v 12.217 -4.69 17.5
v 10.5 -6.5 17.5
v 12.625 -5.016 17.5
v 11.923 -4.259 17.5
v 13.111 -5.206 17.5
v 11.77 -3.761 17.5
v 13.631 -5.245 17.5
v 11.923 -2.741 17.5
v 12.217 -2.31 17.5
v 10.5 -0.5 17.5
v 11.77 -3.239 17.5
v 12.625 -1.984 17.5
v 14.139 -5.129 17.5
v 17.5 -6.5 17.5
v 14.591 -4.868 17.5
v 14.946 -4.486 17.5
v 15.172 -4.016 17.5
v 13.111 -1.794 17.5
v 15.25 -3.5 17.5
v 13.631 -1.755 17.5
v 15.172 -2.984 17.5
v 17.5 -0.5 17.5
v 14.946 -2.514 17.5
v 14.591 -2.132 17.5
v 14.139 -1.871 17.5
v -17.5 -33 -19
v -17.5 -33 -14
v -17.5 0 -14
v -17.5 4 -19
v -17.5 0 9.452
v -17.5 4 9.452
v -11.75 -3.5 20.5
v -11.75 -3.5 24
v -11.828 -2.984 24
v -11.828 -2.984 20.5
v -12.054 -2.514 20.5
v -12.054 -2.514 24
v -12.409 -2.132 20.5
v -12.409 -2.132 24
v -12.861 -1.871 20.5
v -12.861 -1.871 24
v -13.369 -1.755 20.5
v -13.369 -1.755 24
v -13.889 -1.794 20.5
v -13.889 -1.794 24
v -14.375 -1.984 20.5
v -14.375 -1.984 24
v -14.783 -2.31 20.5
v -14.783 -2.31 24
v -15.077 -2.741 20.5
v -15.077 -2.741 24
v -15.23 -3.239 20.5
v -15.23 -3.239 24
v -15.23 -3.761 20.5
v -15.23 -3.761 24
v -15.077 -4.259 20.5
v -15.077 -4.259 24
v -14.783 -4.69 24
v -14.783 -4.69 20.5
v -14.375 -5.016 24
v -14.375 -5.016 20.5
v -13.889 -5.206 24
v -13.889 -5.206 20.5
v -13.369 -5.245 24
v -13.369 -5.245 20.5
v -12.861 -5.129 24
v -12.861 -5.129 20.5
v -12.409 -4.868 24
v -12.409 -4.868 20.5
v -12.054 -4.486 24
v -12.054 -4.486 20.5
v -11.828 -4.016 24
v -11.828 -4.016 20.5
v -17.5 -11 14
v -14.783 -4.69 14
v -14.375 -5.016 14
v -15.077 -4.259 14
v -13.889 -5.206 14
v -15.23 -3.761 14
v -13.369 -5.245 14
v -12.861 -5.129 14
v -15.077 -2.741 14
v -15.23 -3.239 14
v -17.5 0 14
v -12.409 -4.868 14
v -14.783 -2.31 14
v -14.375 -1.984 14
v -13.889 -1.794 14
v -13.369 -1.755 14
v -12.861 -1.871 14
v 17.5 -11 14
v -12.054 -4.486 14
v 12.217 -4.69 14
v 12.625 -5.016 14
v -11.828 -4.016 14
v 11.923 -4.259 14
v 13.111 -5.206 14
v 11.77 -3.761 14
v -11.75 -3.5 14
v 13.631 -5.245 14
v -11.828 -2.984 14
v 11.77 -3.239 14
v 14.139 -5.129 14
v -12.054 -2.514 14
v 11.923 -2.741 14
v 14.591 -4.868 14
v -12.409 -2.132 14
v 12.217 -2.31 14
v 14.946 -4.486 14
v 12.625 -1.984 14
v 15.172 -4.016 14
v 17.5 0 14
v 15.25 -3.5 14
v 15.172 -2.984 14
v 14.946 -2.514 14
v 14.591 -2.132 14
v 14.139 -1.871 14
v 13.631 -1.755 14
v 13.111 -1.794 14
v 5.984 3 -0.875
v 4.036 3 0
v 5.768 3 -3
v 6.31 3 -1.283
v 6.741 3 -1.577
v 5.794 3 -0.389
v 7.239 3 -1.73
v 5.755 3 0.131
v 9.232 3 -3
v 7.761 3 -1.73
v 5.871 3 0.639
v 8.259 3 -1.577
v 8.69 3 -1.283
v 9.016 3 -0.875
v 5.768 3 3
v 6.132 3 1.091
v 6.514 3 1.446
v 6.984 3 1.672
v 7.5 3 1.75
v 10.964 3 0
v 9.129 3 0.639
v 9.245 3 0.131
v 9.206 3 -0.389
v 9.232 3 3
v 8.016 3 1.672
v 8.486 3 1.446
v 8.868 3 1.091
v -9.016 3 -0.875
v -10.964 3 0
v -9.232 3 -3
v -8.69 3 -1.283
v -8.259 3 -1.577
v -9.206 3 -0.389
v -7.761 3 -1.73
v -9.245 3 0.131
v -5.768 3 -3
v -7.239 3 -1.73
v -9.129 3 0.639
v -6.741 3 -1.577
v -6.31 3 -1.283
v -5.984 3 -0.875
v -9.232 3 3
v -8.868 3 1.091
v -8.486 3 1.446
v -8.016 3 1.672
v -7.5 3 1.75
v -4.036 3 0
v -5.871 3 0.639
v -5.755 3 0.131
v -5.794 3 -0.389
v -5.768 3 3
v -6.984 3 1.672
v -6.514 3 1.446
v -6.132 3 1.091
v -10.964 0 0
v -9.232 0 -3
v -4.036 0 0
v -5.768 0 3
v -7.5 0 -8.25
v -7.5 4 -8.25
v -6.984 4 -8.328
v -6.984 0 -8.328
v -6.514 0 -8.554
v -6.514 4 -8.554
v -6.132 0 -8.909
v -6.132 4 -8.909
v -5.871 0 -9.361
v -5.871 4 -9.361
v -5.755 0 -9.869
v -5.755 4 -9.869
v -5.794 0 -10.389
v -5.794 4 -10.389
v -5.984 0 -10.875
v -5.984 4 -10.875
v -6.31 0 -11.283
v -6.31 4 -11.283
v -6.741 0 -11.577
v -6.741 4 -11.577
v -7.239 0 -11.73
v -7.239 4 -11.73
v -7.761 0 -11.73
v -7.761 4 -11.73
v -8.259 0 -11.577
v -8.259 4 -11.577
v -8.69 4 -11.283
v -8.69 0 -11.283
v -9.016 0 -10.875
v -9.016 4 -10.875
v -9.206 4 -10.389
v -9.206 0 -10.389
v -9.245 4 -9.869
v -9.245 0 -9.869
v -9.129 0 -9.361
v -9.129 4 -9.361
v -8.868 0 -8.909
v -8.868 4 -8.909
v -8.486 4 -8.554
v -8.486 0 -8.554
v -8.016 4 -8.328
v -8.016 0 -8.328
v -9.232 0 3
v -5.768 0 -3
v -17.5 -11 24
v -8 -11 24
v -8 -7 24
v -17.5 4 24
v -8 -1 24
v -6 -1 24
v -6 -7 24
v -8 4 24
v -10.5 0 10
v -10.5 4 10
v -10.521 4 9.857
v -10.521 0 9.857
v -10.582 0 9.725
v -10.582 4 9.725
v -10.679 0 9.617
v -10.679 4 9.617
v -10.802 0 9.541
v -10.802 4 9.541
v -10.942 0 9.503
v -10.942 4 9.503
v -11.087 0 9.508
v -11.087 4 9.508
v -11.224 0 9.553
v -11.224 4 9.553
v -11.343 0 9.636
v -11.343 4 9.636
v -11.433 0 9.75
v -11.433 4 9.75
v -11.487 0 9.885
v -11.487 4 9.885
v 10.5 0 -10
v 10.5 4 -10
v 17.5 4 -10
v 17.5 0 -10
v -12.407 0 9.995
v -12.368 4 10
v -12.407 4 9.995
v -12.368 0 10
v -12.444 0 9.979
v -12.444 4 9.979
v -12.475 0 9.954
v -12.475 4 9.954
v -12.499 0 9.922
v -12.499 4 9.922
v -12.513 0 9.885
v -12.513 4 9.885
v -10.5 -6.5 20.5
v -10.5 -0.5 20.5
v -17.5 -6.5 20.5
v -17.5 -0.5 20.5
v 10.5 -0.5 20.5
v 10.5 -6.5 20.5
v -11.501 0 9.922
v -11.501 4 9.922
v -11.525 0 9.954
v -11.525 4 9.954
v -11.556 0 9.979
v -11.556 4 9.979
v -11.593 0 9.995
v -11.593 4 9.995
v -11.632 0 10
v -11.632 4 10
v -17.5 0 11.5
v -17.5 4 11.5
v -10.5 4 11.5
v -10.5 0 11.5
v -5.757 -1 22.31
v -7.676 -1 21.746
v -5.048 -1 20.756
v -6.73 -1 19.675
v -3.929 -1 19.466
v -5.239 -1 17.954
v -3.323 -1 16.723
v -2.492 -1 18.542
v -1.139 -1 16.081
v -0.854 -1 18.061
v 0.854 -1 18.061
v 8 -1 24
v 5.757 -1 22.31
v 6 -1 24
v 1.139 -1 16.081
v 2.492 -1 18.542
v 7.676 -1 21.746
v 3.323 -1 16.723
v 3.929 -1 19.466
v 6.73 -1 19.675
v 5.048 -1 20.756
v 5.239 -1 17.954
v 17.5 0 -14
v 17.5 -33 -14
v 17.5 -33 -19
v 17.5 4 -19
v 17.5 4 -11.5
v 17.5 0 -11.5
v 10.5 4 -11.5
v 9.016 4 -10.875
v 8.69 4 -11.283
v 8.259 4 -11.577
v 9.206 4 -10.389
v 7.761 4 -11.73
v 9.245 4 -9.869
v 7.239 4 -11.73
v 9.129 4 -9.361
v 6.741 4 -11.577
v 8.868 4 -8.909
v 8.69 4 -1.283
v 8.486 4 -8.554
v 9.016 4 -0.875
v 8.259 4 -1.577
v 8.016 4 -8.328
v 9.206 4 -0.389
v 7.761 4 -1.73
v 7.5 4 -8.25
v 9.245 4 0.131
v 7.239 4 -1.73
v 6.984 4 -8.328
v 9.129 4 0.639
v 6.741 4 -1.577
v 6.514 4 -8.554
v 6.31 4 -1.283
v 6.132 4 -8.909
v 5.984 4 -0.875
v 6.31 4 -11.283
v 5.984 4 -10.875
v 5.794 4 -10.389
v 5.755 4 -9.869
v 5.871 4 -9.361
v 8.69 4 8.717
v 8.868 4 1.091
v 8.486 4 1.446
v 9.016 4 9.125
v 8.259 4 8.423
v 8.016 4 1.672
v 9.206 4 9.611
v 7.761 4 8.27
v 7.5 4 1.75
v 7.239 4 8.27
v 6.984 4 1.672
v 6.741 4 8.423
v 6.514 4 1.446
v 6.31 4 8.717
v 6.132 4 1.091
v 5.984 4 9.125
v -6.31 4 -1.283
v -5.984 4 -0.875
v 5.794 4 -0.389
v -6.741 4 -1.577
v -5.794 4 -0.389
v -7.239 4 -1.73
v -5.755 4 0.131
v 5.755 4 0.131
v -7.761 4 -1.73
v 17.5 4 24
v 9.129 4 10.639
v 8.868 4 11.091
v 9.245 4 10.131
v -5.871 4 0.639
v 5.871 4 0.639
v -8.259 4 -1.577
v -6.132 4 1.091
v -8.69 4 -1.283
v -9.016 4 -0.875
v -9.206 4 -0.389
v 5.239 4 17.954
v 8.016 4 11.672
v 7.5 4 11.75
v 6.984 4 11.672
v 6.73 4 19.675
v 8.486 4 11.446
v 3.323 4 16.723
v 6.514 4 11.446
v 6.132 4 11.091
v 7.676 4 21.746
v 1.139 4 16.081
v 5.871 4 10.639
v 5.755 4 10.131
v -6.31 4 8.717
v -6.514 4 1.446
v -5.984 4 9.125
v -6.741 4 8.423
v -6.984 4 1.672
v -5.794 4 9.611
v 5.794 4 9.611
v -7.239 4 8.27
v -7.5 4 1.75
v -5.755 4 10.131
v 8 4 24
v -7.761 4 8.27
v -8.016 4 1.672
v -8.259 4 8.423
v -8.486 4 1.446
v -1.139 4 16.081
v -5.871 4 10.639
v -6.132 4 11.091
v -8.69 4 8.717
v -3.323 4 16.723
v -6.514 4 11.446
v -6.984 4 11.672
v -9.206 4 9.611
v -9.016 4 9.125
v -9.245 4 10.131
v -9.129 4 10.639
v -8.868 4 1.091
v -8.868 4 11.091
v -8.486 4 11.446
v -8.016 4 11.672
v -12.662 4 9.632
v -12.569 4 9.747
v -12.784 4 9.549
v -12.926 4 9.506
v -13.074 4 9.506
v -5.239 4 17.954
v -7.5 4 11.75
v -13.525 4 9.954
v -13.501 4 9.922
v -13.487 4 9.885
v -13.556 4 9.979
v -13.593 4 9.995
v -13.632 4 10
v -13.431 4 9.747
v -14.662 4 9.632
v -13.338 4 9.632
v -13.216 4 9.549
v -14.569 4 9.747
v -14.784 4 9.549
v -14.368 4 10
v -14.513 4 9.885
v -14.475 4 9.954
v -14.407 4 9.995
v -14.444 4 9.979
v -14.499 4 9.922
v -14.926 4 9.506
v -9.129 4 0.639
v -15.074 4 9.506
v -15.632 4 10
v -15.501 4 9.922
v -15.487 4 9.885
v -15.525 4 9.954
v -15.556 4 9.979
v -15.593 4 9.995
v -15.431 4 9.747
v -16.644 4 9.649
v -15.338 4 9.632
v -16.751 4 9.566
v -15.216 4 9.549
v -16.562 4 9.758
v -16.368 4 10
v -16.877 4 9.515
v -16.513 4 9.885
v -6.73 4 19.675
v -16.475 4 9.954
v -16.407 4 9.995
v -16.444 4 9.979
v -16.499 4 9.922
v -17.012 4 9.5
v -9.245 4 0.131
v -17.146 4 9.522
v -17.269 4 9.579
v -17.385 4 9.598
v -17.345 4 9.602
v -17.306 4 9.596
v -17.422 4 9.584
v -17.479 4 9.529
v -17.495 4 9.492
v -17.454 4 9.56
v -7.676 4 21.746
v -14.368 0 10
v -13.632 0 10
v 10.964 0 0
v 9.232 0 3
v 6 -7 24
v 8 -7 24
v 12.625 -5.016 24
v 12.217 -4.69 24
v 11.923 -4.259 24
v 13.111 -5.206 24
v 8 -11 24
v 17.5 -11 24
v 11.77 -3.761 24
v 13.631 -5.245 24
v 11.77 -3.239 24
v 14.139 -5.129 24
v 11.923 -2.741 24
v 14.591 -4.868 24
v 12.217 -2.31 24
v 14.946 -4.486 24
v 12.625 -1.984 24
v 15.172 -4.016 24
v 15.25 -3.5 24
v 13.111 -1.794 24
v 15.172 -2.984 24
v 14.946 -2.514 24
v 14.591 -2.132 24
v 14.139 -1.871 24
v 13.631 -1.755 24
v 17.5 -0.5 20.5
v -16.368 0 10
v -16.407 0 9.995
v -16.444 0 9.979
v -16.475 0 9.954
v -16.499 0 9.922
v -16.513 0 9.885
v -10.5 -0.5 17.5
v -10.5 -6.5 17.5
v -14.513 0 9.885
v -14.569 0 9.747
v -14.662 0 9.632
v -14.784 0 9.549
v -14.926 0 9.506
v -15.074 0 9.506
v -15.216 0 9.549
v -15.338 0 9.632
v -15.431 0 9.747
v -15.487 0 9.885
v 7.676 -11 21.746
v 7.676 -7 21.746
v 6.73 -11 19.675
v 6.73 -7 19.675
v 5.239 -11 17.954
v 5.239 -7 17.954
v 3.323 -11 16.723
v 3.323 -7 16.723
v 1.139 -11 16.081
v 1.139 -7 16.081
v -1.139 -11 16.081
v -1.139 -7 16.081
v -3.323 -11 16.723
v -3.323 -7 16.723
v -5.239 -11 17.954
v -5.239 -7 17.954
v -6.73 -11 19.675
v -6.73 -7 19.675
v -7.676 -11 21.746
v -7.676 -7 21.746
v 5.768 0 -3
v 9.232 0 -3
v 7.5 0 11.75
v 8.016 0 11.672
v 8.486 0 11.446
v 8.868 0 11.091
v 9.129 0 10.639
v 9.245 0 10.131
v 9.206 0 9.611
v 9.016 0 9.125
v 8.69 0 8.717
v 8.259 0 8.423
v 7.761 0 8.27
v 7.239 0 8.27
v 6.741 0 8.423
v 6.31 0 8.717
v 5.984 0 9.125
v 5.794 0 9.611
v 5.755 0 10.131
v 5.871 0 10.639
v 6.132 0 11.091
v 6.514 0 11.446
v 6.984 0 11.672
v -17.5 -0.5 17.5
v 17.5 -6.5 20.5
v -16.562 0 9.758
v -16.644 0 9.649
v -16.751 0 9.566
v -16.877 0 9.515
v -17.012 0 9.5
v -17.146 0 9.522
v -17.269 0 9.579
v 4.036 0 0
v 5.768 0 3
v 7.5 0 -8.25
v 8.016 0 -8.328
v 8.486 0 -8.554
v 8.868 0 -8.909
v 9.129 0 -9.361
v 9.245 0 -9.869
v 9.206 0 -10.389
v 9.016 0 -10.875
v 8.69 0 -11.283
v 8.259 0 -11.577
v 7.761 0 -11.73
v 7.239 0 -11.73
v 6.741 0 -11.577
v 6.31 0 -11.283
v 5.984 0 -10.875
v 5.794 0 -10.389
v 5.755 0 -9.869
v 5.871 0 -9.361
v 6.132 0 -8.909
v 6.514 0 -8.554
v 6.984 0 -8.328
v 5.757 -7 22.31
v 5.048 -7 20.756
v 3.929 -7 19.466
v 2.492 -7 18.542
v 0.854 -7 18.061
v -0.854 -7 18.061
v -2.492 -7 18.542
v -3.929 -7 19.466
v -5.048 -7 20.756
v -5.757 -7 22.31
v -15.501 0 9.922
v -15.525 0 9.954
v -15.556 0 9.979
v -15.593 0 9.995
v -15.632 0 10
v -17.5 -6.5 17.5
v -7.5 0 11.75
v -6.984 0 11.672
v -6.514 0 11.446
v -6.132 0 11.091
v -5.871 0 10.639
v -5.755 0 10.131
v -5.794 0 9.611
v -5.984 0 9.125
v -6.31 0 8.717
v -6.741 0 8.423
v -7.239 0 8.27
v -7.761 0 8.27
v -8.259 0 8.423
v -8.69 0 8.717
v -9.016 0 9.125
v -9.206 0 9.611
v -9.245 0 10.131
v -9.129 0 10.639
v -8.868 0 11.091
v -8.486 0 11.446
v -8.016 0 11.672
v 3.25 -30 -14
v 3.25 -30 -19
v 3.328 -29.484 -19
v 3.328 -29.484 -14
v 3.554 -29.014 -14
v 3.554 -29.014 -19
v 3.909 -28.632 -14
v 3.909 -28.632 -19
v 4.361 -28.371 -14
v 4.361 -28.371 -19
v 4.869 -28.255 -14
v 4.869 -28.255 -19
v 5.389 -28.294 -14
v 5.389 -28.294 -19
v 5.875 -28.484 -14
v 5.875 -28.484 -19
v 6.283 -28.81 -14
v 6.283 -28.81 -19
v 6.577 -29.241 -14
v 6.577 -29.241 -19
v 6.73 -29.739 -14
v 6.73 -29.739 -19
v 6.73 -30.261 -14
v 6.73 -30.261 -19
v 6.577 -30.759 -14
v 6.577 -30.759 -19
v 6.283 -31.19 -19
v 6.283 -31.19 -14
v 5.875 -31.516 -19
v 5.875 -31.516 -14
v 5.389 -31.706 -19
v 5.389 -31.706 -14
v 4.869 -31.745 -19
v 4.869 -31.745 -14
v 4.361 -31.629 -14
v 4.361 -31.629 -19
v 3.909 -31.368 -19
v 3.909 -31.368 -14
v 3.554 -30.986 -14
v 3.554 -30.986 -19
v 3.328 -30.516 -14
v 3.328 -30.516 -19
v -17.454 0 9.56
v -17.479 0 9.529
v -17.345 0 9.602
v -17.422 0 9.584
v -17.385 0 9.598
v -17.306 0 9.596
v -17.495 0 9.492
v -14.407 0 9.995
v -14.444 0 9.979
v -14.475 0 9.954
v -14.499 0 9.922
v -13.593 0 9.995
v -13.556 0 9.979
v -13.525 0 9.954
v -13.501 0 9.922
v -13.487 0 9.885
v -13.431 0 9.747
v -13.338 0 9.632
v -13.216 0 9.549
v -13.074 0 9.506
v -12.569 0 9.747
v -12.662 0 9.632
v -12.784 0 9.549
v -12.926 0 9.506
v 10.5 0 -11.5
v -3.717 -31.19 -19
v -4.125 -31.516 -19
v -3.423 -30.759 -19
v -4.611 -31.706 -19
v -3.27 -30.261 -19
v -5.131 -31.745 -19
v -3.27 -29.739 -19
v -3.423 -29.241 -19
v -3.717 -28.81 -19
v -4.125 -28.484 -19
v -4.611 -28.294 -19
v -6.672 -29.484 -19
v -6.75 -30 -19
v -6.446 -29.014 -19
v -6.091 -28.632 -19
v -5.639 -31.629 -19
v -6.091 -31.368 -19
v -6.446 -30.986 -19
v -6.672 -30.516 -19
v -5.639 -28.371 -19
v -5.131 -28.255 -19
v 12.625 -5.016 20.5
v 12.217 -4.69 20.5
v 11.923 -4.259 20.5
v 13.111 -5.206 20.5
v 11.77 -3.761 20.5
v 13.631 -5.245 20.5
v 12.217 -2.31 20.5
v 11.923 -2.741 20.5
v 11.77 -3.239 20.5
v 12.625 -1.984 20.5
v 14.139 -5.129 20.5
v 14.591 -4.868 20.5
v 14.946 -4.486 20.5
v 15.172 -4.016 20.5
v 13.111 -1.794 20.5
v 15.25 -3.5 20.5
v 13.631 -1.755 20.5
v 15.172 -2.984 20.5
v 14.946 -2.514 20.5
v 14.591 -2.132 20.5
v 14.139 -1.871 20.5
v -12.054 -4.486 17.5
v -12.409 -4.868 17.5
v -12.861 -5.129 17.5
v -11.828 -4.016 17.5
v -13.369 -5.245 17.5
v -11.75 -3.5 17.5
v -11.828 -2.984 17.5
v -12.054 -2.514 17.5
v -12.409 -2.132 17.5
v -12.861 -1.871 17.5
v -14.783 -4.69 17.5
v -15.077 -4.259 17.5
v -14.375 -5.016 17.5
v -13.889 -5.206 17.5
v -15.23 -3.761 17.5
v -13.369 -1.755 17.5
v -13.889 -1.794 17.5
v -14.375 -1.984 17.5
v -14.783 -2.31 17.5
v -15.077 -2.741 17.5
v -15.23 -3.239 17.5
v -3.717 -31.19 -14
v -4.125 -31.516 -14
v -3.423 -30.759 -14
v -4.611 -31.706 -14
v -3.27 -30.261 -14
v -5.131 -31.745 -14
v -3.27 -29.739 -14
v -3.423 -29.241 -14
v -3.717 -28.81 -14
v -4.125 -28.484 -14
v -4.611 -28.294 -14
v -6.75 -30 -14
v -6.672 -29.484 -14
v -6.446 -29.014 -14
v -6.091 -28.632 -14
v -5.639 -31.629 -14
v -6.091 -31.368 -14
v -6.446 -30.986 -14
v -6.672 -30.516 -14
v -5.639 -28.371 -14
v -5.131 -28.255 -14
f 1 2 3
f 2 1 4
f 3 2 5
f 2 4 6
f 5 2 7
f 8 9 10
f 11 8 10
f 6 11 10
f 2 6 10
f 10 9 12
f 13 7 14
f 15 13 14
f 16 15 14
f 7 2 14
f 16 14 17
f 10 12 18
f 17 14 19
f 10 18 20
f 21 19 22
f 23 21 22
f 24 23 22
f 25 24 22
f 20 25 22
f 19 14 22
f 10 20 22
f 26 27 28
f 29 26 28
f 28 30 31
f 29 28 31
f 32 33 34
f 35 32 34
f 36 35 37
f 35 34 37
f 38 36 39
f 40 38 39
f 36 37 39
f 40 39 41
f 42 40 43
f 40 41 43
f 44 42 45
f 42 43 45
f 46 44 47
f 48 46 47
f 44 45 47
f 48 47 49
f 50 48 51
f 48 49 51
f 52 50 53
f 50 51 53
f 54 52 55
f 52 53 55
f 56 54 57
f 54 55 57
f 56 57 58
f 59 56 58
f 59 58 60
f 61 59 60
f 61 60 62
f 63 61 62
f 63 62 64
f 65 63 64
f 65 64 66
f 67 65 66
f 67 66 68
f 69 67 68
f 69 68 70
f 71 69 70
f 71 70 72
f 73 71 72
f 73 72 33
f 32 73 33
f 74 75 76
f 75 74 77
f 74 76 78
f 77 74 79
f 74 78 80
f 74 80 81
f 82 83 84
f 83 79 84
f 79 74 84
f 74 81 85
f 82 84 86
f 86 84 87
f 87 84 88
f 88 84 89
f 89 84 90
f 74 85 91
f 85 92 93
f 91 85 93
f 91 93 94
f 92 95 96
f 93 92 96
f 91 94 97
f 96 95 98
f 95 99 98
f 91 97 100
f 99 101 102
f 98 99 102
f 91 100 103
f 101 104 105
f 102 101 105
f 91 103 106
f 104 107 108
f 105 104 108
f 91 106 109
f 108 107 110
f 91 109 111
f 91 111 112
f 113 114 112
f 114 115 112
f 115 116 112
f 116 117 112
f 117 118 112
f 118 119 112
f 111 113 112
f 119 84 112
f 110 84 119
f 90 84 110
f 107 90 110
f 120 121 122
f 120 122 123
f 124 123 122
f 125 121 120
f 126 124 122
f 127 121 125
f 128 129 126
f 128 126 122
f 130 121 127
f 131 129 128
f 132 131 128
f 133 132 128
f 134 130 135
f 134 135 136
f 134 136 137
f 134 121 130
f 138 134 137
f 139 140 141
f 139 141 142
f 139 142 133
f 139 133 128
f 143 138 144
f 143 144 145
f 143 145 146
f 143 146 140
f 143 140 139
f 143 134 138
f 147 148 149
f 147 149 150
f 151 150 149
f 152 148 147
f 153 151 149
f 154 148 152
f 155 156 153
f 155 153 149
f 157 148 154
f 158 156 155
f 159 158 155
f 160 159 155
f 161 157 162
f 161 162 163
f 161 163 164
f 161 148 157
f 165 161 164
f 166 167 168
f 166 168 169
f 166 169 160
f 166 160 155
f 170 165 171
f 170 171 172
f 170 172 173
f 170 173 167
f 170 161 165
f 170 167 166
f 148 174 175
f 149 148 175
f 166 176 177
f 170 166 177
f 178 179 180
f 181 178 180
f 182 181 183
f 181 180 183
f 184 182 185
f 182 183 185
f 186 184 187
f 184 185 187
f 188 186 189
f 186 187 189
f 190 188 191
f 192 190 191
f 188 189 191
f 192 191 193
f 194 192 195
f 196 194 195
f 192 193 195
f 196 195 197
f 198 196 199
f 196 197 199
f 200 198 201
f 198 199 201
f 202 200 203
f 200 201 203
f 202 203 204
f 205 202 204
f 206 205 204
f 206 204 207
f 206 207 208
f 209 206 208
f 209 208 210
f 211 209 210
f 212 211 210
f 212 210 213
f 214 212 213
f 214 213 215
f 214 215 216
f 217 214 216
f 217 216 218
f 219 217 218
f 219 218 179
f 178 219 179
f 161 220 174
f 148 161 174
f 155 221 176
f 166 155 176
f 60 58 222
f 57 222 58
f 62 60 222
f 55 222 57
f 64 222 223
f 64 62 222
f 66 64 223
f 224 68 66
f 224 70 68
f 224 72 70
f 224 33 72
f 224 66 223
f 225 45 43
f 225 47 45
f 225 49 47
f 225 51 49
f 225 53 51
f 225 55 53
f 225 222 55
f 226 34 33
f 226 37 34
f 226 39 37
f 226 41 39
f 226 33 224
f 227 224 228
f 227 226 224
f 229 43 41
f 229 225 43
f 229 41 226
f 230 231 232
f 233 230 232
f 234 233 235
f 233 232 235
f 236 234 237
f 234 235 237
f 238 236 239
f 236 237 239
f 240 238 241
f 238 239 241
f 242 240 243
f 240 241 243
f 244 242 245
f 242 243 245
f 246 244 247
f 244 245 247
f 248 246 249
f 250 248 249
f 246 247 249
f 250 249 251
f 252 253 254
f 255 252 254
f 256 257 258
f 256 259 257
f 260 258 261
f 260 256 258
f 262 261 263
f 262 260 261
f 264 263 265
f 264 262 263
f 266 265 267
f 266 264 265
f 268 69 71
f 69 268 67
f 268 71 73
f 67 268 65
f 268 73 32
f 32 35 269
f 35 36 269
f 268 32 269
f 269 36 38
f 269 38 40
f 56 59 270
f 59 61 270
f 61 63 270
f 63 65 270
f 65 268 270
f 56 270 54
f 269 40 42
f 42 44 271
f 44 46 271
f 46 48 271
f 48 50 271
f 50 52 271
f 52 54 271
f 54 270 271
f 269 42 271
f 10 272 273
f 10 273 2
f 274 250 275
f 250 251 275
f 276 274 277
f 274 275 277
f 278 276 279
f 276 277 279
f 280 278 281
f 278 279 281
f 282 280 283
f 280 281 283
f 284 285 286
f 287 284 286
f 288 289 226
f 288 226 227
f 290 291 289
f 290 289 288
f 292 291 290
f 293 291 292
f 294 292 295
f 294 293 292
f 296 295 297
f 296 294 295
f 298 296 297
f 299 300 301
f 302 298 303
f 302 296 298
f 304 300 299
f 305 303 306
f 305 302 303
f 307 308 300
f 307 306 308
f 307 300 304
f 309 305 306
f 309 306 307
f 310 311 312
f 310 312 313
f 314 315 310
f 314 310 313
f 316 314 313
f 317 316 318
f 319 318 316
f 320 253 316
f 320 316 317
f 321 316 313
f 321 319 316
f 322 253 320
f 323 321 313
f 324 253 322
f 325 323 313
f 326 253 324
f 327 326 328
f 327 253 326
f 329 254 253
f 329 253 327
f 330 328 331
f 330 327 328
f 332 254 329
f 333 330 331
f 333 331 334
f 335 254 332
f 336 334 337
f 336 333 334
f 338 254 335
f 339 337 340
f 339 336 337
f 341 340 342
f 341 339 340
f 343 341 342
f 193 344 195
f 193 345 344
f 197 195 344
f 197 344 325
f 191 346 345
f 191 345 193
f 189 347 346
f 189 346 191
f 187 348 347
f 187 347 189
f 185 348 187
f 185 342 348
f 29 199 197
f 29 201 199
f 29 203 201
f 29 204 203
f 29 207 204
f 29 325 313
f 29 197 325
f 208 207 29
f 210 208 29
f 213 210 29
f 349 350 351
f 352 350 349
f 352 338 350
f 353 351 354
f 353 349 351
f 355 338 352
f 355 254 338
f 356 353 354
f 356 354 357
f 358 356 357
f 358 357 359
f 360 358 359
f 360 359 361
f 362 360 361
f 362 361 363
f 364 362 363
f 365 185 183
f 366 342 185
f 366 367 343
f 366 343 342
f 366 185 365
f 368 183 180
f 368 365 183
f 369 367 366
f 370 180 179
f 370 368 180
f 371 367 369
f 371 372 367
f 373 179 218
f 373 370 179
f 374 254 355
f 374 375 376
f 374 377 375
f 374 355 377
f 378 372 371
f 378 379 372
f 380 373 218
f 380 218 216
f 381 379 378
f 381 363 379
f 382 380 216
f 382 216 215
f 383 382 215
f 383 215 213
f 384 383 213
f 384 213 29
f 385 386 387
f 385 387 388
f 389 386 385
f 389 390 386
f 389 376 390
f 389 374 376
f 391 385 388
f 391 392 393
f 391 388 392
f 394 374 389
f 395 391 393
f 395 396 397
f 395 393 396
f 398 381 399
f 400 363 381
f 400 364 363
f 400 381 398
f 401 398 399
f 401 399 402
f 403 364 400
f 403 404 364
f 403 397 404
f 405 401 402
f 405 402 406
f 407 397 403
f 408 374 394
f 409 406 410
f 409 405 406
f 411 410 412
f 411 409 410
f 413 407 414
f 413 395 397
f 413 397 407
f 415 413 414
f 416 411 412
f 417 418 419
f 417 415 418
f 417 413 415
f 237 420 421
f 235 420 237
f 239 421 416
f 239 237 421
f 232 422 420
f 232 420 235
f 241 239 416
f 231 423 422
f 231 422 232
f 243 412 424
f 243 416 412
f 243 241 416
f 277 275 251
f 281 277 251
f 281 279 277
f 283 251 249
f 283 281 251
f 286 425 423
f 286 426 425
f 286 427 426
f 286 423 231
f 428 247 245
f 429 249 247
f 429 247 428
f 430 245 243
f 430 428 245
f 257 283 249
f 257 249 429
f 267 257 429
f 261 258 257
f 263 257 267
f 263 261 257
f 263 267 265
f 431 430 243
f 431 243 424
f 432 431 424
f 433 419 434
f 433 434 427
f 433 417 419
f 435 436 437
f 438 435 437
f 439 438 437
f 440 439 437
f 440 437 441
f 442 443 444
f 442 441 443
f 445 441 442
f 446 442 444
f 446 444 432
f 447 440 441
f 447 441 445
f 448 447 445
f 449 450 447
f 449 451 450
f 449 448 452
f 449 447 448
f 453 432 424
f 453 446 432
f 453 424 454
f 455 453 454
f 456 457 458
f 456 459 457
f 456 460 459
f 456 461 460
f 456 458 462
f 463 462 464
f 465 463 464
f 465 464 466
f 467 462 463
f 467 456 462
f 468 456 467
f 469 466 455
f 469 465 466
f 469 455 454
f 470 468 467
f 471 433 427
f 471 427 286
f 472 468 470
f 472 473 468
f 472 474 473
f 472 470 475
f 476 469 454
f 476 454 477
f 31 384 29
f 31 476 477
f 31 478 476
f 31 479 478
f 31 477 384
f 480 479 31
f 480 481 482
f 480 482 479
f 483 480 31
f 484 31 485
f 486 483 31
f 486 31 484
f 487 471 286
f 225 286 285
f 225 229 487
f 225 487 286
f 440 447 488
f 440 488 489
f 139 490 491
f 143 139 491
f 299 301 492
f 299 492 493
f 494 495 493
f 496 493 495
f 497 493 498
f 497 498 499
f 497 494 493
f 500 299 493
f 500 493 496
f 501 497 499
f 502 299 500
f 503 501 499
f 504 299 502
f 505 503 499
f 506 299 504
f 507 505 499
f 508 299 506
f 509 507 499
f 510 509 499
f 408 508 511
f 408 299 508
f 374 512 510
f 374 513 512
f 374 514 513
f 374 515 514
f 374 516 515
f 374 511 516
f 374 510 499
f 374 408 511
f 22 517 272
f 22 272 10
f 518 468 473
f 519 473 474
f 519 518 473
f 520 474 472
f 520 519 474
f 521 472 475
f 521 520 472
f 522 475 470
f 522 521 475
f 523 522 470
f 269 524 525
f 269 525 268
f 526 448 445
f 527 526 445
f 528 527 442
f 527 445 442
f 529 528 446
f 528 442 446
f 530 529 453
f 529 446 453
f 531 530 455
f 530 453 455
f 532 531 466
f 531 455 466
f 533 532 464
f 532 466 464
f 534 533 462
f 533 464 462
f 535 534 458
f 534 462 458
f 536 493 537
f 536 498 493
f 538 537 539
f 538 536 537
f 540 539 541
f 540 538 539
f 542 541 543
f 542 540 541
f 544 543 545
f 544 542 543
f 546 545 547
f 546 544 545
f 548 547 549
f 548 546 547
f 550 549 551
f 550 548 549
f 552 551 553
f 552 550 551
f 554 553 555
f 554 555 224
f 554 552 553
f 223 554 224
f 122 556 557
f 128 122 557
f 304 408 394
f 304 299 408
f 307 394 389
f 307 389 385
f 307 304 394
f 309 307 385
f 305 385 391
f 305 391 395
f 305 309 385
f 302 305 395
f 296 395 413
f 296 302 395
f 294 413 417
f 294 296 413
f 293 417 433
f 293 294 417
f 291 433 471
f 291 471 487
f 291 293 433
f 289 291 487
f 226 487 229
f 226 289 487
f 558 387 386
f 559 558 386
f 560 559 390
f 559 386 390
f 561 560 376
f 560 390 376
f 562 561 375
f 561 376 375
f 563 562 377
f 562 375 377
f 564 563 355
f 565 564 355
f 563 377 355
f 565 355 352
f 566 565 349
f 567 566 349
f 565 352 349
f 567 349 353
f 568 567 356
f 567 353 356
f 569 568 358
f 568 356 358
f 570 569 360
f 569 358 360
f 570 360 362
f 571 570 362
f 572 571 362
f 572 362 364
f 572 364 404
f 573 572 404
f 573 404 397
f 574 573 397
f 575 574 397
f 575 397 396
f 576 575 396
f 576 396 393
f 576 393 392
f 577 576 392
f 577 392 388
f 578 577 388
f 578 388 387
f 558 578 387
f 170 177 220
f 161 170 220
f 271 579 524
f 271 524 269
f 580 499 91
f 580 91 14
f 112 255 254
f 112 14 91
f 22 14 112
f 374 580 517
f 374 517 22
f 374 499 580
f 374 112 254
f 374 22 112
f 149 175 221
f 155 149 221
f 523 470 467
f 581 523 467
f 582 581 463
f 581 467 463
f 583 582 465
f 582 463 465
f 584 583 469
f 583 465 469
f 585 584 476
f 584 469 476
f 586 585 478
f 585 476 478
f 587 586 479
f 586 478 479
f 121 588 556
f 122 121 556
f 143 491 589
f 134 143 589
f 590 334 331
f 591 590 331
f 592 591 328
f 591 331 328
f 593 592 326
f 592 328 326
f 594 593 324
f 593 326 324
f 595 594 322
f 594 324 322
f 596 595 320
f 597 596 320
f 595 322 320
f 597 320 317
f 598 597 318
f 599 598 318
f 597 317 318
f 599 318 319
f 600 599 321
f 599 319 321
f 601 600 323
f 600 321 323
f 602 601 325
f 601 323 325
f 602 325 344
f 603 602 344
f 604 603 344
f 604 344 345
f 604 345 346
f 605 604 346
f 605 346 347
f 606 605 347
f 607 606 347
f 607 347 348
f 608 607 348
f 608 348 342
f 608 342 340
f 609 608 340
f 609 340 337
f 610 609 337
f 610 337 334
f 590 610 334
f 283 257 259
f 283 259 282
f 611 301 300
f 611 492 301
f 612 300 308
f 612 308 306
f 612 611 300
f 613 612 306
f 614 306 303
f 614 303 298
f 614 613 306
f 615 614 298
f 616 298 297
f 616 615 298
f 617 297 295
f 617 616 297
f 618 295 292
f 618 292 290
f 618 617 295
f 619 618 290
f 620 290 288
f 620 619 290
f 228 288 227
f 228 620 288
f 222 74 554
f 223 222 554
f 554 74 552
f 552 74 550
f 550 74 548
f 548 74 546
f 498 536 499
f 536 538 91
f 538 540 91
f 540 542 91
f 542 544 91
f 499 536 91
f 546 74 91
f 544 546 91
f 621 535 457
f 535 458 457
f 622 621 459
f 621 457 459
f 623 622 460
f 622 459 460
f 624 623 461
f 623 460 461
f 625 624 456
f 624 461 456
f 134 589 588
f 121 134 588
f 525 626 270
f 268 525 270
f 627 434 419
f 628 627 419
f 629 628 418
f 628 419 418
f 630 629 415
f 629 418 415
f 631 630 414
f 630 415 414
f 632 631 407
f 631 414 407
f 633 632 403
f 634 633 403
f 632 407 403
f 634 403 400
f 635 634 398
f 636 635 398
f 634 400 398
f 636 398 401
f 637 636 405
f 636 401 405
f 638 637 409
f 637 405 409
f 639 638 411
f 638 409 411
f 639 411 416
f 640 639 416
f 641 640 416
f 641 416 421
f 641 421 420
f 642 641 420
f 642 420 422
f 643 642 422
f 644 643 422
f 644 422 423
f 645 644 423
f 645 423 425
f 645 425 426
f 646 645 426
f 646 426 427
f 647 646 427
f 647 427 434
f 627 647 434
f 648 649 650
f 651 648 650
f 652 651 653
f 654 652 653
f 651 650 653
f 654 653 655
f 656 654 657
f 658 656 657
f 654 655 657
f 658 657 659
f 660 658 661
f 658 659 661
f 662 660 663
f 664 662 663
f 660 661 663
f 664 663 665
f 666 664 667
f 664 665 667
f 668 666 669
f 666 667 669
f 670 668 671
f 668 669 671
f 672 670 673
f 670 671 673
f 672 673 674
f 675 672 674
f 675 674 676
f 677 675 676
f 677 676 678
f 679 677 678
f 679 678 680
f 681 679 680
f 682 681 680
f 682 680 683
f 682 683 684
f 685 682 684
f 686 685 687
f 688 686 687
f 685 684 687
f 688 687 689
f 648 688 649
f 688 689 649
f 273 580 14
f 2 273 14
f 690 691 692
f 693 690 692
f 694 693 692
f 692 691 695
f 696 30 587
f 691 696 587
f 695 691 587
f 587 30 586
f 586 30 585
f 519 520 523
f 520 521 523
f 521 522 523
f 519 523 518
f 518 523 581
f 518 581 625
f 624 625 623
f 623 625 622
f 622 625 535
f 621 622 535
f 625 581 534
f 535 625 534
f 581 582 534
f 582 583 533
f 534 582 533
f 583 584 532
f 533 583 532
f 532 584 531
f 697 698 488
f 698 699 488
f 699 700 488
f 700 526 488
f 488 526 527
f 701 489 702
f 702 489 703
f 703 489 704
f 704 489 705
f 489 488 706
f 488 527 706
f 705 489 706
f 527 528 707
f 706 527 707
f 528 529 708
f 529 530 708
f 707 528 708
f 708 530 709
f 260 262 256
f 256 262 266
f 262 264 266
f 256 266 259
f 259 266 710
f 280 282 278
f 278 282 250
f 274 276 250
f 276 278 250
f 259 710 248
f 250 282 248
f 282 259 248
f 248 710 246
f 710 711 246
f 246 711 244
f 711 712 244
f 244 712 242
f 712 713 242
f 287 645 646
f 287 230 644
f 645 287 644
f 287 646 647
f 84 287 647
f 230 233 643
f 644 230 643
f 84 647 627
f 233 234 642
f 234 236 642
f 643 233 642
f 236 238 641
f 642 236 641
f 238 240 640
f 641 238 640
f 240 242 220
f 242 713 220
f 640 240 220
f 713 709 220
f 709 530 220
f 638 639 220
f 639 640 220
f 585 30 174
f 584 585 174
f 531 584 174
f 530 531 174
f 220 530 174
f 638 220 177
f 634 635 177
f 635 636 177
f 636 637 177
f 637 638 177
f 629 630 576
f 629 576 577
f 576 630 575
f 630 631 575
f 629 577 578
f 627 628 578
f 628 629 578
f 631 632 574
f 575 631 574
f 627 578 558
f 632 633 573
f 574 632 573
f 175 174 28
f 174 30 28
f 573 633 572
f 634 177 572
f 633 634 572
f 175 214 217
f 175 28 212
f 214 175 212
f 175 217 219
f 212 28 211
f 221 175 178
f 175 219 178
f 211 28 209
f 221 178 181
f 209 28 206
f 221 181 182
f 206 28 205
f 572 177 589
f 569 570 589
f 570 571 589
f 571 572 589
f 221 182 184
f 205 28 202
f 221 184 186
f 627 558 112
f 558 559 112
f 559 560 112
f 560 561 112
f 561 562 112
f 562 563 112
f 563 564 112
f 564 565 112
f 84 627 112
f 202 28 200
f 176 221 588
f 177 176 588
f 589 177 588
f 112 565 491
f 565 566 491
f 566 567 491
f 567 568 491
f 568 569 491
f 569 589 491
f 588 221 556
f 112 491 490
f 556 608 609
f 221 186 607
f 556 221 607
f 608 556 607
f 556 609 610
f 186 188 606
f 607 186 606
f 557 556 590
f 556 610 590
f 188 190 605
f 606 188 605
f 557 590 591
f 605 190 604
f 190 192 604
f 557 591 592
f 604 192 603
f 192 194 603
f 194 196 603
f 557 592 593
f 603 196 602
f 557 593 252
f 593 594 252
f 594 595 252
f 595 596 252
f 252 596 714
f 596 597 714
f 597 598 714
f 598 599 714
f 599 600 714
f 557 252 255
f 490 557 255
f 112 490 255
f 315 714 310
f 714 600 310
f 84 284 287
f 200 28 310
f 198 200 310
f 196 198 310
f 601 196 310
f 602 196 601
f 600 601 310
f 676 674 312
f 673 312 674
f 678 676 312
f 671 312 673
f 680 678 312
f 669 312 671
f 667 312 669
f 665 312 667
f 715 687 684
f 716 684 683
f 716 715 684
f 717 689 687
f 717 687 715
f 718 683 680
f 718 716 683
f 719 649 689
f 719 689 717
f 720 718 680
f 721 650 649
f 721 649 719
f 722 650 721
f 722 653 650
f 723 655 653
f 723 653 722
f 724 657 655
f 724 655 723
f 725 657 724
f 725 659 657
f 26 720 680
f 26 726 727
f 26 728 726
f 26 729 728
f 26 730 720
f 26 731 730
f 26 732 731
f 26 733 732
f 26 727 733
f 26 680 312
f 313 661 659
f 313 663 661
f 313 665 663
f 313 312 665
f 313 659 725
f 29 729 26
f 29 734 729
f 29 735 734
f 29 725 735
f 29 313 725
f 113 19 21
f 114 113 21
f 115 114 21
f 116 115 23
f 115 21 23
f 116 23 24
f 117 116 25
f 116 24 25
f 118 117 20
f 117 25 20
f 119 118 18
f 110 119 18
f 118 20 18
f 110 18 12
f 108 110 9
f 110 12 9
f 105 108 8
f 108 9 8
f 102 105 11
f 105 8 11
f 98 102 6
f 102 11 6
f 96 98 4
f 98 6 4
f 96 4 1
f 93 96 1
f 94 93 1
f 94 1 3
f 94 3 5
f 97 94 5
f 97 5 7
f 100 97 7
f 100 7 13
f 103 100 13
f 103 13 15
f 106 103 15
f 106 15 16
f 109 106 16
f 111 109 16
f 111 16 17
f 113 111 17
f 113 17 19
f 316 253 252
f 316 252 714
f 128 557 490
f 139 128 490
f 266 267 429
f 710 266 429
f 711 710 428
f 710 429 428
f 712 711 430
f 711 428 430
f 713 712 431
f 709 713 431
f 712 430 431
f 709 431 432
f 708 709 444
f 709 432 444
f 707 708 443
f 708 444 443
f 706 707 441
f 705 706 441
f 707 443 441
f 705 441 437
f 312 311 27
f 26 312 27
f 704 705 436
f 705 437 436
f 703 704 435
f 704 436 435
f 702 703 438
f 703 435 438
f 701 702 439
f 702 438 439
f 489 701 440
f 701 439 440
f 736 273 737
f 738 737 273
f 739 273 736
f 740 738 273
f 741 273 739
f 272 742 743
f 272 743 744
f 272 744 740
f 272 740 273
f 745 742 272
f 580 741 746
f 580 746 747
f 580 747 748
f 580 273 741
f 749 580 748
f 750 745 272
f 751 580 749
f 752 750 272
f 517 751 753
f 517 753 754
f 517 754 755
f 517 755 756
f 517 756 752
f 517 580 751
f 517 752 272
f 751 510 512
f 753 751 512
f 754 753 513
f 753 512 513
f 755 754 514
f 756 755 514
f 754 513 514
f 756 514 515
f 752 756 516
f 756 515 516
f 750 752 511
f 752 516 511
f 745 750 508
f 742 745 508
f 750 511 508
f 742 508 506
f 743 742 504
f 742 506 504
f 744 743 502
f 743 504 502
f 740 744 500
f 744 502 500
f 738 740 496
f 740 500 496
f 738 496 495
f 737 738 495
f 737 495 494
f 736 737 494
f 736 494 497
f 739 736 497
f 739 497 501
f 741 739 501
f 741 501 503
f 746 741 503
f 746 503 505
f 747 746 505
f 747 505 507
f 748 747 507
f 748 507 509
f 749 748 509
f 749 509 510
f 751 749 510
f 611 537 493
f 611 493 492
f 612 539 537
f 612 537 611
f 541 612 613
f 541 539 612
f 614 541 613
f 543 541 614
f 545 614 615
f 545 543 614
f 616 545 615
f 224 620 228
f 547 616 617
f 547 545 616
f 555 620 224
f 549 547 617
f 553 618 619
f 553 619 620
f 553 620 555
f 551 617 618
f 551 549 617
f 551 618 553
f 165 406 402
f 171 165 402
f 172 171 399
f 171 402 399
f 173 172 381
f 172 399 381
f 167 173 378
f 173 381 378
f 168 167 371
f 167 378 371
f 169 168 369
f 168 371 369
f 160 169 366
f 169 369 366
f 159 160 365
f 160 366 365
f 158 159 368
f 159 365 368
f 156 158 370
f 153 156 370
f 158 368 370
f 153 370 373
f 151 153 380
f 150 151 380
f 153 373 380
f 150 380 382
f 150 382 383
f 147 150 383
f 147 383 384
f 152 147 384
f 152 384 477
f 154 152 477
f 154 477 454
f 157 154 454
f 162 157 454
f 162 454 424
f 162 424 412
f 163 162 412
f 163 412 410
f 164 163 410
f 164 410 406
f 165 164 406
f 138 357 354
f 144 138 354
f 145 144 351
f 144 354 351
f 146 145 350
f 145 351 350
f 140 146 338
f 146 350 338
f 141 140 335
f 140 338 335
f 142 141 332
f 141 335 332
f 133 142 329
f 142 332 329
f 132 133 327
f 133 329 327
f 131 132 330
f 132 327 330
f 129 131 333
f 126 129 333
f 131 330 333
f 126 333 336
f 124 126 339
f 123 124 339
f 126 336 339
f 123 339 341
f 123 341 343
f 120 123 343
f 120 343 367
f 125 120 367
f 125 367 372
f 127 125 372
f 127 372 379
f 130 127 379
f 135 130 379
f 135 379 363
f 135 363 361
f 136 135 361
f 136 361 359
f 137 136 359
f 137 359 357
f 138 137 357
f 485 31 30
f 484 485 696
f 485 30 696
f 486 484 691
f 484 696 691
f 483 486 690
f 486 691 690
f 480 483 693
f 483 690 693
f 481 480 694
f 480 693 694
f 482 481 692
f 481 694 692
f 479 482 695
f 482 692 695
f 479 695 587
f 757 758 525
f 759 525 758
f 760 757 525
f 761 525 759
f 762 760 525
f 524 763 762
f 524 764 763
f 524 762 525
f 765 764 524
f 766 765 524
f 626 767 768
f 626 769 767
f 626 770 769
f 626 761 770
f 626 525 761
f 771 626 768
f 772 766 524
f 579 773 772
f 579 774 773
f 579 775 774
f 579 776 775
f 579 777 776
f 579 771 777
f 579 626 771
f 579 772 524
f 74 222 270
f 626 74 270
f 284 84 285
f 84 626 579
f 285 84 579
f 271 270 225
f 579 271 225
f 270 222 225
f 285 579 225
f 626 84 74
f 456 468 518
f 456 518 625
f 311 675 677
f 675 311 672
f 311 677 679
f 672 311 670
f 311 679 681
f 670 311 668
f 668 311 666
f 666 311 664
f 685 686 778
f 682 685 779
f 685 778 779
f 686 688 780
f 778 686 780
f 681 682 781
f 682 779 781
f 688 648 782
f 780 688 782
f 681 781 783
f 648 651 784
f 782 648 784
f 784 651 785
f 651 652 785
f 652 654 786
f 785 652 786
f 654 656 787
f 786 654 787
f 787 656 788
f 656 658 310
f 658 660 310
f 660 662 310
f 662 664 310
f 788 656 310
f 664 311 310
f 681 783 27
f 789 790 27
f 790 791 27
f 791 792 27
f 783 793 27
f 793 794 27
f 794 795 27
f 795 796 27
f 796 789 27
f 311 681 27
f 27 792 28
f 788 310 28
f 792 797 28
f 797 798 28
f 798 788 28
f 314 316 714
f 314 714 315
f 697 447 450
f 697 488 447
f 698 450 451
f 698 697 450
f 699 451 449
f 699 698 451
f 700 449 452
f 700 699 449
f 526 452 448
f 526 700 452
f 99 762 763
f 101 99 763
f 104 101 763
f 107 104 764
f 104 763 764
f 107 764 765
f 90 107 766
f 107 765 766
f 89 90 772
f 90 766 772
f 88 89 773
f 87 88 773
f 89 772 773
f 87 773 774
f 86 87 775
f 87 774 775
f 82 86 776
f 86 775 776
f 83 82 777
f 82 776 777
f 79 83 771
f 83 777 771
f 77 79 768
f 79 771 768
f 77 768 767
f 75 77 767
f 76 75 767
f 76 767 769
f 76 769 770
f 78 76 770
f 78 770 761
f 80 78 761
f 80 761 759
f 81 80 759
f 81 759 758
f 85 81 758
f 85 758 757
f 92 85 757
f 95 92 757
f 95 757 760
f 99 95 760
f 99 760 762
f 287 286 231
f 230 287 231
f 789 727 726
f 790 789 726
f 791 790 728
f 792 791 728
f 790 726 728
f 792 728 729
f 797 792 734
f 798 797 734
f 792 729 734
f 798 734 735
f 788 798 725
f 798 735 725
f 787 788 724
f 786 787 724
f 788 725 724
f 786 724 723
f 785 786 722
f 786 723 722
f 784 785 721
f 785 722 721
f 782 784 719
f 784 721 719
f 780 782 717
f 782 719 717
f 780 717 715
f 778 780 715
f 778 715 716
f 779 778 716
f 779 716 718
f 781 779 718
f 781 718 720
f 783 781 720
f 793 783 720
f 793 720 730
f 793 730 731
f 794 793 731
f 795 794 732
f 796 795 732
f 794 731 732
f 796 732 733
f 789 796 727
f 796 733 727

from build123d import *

# Parameters (mm, degrees)
SKETCH1_W           = 35
SKETCH1_H           = 28
BOSS_EXTRUDE1_DEPTH = 4
SKETCH2_R           = 1.75
CUT_EXTRUDE1_DEPTH  = 23.765104876
SKETCH3_W           = 35
SKETCH3_H           = 15
BOSS_EXTRUDE2_DEPTH = 10
CUT_REVOLVE1_ANGLE  = 180
SKETCH6_R           = 1.75
CUT_EXTRUDE3_DEPTH  = 10
SKETCH8_W           = 3
SKETCH8_H           = 6
CUT_EXTRUDE4_DEPTH  = 7
SKETCH9_W           = 3
SKETCH9_H           = 6
CUT_EXTRUDE5_DEPTH  = 7
SKETCH7_W           = 35
SKETCH7_H           = 37
BOSS_EXTRUDE3_DEPTH = 5
SKETCH10_R          = 1.75
CUT_EXTRUDE6_DEPTH  = 5
SKETCH18_W          = 7
SKETCH18_H          = 1.5
CUT_EXTRUDE14_DEPTH = 48.44733923
SKETCH19_R          = 1.75
CUT_EXTRUDE15_DEPTH = 48.44733923
CUT_EXTRUDE16_DEPTH = 3
SKETCH21_R          = 0.5
CUT_EXTRUDE17_DEPTH = 4
LPATTERN2_COUNT     = 4
LPATTERN2_PITCH     = 2
FILLET2_R           = 0.15


with BuildPart() as part:
    # Sketch1 → Boss-Extrude1 (new body)
    with BuildSketch(Plane(origin=(0, 0, 0), x_dir=(1, 0, 0), z_dir=(0, 1, 0))):
        Rectangle(SKETCH1_W, SKETCH1_H)
    extrude(amount=BOSS_EXTRUDE1_DEPTH)

    # Sketch2 → Cut-Extrude1 (cut, through all)
    with BuildSketch(Plane(origin=(0, 4, 0), x_dir=(1, 0, 0), z_dir=(0, 1, 0))):
        with Locations(Location((-7.5, -10, 0), (0, 0, 270))):
            Circle(SKETCH2_R)
        with Locations(Location((-7.5, 10, 0), (0, 0, 270))):
            Circle(SKETCH2_R)
        with Locations(Location((7.5, -10, 0), (0, 0, 270))):
            Circle(SKETCH2_R)
        with Locations(Location((7.5, 10, 0), (0, 0, 270))):
            Circle(SKETCH2_R)
    extrude(amount=-CUT_EXTRUDE1_DEPTH, mode=Mode.SUBTRACT)

    # Sketch3 → Boss-Extrude2 (add)
    with BuildSketch(Plane.XY.offset(14)):
        with Locations((0, -3.5)):
            Rectangle(SKETCH3_W, SKETCH3_H)
    extrude(amount=BOSS_EXTRUDE2_DEPTH)

    # Sketch5 → Cut-Revolve1 (revolve, cut)
    with BuildSketch(Plane.XY.offset(24)):
        Polygon((0, 4), (8, 4), (8, -1), (6, -1), (6, -7), (8, -7), (8, -11), (0, -11), align=None)
    revolve(axis=Axis((0, 4, 24), (0, 1, 0)), revolution_arc=CUT_REVOLVE1_ANGLE, mode=Mode.SUBTRACT)

    # Sketch6 → Cut-Extrude3 (cut)
    with BuildSketch(Plane.XY.offset(24)):
        with Locations((-13.5, -3.5)):
            Circle(SKETCH6_R)
        with Locations((13.5, -3.5)):
            Circle(SKETCH6_R)
    extrude(amount=-CUT_EXTRUDE3_DEPTH, mode=Mode.SUBTRACT)

    # Sketch8 → Cut-Extrude4 (cut)
    with BuildSketch(Plane.ZY.offset(17.5)):
        with Locations((19, -3.5)):
            Rectangle(SKETCH8_W, SKETCH8_H)
    extrude(amount=-CUT_EXTRUDE4_DEPTH, mode=Mode.SUBTRACT)

    # Sketch9 → Cut-Extrude5 (cut)
    with BuildSketch(Plane(origin=(17.5, 0, 0), x_dir=(0, 0, -1), z_dir=(1, 0, 0))):
        with Locations((-19, -3.5)):
            Rectangle(SKETCH9_W, SKETCH9_H)
    extrude(amount=-CUT_EXTRUDE5_DEPTH, mode=Mode.SUBTRACT)

    # Sketch7 → Boss-Extrude3 (add)
    with BuildSketch(Plane(origin=(0, 0, -14), x_dir=(-1, 0, 0), z_dir=(0, 0, -1))):
        with Locations((0, -14.5)):
            Rectangle(SKETCH7_W, SKETCH7_H)
    extrude(amount=BOSS_EXTRUDE3_DEPTH)

    # Sketch10 → Cut-Extrude6 (cut)
    with BuildSketch(Plane(origin=(0, 0, -19), x_dir=(-1, 0, 0), z_dir=(0, 0, -1))):
        with Locations((-5, -30)):
            Circle(SKETCH10_R)
        with Locations((5, -30)):
            Circle(SKETCH10_R)
    extrude(amount=-CUT_EXTRUDE6_DEPTH, mode=Mode.SUBTRACT)

    # Sketch18 → Cut-Extrude14 (cut, through all)
    with BuildSketch(Plane(origin=(0, 4, 0), x_dir=(1, 0, 0), z_dir=(0, 1, 0))):
        with Locations((-14, -10.75)):
            Rectangle(SKETCH18_W, SKETCH18_H)
        with Locations((14, 10.75)):
            Rectangle(SKETCH18_W, SKETCH18_H)
    extrude(amount=-CUT_EXTRUDE14_DEPTH, mode=Mode.SUBTRACT)

    # Sketch19 → Cut-Extrude15 (cut, through all)
    with BuildSketch(Plane(origin=(0, 4, 0), x_dir=(1, 0, 0), z_dir=(0, 1, 0))):
        with Locations(Location((-7.5, 0, 0), (0, 0, 270))):
            Circle(SKETCH19_R)
        with Locations(Location((7.5, 0, 0), (0, 0, 270))):
            Circle(SKETCH19_R)
    extrude(amount=-CUT_EXTRUDE15_DEPTH, mode=Mode.SUBTRACT)

    # Sketch20 → Cut-Extrude16 (cut)
    with BuildSketch(Plane.XZ):
        Polygon((10.964101615, 0), (9.232050808, 3), (5.767949192, 3), (4.035898385, 0), (5.767949192, -3), (9.232050808, -3), align=None)
        Polygon((-10.964101615, 0), (-9.232050808, -3), (-5.767949192, -3), (-4.035898385, 0), (-5.767949192, 3), (-9.232050808, 3), align=None)
    extrude(amount=-CUT_EXTRUDE16_DEPTH, mode=Mode.SUBTRACT)

    # Sketch21 → Cut-Extrude17 (cut)
    with BuildSketch(Plane(origin=(0, 4, 0), x_dir=(1, 0, 0), z_dir=(0, 1, 0))):
        with Locations((-17, -10)):
            Circle(SKETCH21_R)
    cut_extrude17 = extrude(amount=-CUT_EXTRUDE17_DEPTH, mode=Mode.SUBTRACT)

    # LPattern2: Cut-Extrude17 ×4
    with Locations(*[(i * LPATTERN2_PITCH, 0, 0) for i in range(1, LPATTERN2_COUNT)]):
        add(cut_extrude17, mode=Mode.SUBTRACT)

    # Fillet2
    fillet2_edges = [part.edges().sort_by_distance(p)[0] for p in [
        (-17.5, 2, 10),
        (-16.5, 2, 10),
        (-12.5, 2, 10),
        (-13.5, 2, 10),
        (-14.5, 2, 10),
        (-15.5, 2, 10),
        (-11.5, 2, 10),
    ]]
    fillet(fillet2_edges, radius=FILLET2_R)


solid = part.part
